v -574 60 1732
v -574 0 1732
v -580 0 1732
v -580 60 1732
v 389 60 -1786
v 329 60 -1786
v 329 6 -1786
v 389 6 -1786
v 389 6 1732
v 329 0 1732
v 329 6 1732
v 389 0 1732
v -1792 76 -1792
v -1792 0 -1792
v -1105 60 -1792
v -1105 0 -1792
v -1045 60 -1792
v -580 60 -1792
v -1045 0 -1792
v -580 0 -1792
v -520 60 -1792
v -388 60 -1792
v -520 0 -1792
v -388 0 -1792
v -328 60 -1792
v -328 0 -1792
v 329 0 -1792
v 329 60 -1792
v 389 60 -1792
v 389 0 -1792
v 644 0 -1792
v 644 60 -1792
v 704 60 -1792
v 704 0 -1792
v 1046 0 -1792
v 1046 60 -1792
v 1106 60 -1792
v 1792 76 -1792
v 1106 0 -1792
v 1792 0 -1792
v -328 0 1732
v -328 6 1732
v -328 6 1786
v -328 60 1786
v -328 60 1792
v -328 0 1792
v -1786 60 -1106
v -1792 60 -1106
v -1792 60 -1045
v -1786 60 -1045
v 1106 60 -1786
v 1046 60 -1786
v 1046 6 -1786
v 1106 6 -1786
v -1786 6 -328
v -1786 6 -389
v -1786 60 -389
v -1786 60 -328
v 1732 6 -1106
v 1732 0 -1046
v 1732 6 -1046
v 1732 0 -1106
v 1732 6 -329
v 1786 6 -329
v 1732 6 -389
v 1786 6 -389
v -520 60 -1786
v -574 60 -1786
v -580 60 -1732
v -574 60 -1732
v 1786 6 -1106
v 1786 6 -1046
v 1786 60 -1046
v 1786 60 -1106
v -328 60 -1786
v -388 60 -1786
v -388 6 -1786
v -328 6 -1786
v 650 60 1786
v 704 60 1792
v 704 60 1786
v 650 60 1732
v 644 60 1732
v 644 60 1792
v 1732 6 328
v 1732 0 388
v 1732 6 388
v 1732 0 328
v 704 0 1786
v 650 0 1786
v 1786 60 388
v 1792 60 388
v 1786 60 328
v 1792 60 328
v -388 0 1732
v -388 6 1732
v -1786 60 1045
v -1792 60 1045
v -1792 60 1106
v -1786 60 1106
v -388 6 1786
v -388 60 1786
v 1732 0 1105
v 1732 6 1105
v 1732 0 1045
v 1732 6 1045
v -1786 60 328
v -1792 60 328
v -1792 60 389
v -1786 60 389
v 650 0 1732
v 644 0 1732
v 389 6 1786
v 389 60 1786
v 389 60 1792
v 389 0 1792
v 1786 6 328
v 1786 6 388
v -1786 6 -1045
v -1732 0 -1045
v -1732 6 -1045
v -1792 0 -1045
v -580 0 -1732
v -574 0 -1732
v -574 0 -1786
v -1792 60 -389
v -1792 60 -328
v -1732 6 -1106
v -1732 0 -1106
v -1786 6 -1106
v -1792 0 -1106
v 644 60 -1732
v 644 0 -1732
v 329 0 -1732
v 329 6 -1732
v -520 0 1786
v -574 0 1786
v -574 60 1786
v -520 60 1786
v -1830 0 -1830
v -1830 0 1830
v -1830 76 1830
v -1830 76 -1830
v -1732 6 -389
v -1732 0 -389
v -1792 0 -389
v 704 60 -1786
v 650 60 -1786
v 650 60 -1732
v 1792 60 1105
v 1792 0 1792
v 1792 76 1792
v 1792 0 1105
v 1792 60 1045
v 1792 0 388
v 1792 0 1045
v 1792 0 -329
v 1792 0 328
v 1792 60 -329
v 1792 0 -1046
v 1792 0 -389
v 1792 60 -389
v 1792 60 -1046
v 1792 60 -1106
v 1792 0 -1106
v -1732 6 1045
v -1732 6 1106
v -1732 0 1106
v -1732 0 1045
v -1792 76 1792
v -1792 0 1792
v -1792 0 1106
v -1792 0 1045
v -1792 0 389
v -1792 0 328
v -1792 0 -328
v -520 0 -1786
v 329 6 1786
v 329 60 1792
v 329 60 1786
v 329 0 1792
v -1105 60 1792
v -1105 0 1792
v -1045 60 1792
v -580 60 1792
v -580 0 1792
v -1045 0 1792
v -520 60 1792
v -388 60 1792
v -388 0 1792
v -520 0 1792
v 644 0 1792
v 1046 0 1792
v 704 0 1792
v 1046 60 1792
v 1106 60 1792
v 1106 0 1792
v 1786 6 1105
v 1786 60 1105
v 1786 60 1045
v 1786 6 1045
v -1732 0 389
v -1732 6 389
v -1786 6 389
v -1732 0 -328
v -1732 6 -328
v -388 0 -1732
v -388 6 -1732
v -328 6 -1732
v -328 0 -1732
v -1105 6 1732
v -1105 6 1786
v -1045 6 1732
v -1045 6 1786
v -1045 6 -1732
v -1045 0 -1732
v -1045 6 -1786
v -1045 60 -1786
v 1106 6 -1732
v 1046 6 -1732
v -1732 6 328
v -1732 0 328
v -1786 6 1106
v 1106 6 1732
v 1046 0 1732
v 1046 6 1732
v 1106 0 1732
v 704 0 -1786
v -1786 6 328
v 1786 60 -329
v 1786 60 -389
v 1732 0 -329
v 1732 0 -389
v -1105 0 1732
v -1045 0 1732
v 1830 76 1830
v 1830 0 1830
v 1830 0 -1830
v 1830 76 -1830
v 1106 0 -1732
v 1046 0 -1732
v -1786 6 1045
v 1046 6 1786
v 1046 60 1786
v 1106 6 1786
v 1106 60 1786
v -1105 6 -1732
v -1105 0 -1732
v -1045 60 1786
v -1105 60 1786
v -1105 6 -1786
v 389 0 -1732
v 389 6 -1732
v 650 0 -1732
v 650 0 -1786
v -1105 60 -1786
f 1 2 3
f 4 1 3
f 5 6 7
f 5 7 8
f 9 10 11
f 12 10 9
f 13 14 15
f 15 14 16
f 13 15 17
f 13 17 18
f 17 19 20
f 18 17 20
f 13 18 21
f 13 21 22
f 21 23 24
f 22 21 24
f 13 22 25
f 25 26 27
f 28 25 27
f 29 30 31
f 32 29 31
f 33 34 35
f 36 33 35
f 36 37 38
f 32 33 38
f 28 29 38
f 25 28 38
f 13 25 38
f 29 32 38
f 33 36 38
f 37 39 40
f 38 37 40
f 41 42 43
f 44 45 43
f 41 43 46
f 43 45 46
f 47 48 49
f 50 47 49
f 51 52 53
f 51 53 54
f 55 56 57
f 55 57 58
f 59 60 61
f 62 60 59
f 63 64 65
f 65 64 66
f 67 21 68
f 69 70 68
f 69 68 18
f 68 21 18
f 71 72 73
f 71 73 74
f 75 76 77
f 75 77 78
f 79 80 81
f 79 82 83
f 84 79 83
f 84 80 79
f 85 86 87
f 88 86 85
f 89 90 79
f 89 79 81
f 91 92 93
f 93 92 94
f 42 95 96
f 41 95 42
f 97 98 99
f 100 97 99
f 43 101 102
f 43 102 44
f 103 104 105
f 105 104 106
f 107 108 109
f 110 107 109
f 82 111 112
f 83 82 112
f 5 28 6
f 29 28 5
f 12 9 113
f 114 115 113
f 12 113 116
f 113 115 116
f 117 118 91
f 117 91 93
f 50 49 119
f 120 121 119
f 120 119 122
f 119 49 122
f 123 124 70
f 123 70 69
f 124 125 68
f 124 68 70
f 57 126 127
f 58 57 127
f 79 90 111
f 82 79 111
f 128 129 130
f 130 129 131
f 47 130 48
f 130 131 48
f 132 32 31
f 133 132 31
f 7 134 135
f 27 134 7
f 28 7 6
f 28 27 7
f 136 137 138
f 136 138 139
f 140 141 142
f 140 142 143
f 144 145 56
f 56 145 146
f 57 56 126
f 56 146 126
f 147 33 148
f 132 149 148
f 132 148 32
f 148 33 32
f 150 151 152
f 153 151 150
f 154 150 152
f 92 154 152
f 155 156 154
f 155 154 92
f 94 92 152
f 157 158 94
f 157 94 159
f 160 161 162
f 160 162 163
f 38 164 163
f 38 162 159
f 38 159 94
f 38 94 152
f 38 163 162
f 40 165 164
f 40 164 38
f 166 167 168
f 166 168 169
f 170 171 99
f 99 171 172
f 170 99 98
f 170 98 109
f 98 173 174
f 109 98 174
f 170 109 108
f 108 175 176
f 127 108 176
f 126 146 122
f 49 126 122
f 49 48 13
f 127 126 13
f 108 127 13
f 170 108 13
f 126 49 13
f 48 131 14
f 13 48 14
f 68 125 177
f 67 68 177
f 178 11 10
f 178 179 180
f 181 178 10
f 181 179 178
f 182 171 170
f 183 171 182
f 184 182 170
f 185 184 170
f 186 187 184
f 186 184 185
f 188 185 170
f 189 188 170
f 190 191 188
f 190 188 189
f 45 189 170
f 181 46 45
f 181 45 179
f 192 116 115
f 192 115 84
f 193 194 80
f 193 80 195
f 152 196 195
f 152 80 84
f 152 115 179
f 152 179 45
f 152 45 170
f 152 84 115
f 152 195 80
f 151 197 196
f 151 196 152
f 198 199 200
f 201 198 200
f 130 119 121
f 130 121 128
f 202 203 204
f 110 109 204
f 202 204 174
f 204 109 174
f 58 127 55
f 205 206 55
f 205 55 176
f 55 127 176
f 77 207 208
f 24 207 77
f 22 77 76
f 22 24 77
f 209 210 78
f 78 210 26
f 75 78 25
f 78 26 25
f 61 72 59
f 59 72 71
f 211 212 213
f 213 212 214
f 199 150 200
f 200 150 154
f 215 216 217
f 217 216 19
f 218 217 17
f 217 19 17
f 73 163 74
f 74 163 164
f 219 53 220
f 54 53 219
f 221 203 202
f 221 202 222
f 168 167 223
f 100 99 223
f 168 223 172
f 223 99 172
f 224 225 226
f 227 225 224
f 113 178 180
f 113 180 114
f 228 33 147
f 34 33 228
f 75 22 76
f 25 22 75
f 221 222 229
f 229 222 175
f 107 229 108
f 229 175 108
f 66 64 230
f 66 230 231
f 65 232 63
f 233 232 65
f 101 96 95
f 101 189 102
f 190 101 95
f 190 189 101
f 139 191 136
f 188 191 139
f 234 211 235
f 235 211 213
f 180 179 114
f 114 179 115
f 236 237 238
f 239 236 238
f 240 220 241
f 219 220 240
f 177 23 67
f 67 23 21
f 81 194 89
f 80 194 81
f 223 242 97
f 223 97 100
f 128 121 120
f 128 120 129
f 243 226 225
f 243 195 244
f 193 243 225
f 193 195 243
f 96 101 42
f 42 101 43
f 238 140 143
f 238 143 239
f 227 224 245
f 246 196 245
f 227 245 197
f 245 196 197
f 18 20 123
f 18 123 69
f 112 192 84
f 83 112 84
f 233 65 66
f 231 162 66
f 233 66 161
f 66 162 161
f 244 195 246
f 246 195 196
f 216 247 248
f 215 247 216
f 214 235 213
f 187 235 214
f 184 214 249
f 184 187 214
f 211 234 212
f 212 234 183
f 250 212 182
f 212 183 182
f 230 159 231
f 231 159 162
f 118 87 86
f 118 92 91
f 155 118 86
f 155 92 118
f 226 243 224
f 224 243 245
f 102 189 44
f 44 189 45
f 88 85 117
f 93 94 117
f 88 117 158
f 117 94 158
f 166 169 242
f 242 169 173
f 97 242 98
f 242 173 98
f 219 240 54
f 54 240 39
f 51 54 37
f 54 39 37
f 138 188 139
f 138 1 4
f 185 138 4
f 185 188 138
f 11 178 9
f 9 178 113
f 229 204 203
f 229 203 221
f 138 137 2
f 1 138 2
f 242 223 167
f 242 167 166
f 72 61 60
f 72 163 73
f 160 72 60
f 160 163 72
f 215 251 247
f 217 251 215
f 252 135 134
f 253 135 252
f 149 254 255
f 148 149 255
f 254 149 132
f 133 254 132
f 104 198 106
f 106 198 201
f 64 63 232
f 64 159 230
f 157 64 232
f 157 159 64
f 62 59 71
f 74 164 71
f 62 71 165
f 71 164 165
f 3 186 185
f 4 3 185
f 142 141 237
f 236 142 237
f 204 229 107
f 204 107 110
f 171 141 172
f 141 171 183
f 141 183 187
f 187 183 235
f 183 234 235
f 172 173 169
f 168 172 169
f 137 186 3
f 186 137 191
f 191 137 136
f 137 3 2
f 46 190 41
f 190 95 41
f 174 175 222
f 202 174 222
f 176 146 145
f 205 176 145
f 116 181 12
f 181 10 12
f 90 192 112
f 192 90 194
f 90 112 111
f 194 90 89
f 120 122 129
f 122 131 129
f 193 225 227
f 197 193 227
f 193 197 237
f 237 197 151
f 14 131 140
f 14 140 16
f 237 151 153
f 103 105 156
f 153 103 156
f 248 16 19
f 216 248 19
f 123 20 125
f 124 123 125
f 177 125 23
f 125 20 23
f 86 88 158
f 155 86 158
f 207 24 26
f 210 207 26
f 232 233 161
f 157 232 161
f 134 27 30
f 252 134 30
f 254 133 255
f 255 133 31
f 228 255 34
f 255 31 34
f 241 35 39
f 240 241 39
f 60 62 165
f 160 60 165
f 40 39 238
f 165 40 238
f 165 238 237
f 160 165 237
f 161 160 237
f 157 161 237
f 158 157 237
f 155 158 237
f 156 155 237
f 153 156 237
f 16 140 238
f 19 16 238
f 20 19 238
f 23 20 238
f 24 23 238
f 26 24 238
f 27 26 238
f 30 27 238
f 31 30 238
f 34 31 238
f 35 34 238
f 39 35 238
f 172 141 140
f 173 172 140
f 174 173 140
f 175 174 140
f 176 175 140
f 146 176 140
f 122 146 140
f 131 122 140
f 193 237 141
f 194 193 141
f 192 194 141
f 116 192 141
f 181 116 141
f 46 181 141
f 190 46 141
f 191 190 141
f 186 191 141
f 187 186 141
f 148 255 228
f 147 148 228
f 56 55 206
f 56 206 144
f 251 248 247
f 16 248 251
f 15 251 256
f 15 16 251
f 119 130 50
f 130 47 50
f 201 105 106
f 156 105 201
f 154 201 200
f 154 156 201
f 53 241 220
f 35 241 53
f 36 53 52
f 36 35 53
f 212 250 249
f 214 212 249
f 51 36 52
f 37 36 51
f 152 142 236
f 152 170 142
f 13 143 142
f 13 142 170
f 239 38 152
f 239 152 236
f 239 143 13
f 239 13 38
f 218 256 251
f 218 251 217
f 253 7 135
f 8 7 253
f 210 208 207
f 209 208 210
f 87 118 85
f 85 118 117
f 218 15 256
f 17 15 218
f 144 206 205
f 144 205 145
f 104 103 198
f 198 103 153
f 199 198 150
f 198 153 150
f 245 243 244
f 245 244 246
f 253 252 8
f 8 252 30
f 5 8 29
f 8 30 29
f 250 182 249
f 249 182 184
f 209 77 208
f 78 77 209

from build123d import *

# Parameters (mm, degrees)
SKETCH1_W                = 3660
SKETCH1_H                = 3660
SKETCH1_W_2              = 3584
SKETCH1_H_2              = 3584
BOSS_EXTRUDE1_DEPTH      = 76
SKETCH2_W                = 60
SKETCH2_H                = 60
BOSS_EXTRUDE2_DEPTH      = 6
SKETCH4_W                = 60
SKETCH4_H                = 6
BOSS_EXTRUDE3_DEPTH      = 54
LPATTERN1_COUNT          = 4
LPATTERN1_PITCH          = 717
MIRROR1_COPY_1_SKETCH_W  = 60
MIRROR1_COPY_1_SKETCH_H  = 60
MIRROR1_COPY_1_DEPTH     = 6
MIRROR1_COPY_2_SKETCH_W  = 60
MIRROR1_COPY_2_SKETCH_H  = 60
MIRROR1_COPY_2_DEPTH     = 6
MIRROR1_COPY_3_SKETCH_W  = 60
MIRROR1_COPY_3_SKETCH_H  = 60
MIRROR1_COPY_3_DEPTH     = 6
MIRROR1_COPY_4_SKETCH_W  = 60
MIRROR1_COPY_4_SKETCH_H  = 6
MIRROR1_COPY_4_DEPTH     = 54
MIRROR1_COPY_5_SKETCH_W  = 60
MIRROR1_COPY_5_SKETCH_H  = 6
MIRROR1_COPY_5_DEPTH     = 54
MIRROR1_COPY_6_SKETCH_W  = 60
MIRROR1_COPY_6_SKETCH_H  = 6
MIRROR1_COPY_6_DEPTH     = 54
MIRROR2_COPY_1_SKETCH_W  = 60
MIRROR2_COPY_1_SKETCH_H  = 60
MIRROR2_COPY_1_DEPTH     = 6
MIRROR2_COPY_2_SKETCH_W  = 60
MIRROR2_COPY_2_SKETCH_H  = 60
MIRROR2_COPY_2_DEPTH     = 6
MIRROR2_COPY_3_SKETCH_W  = 60
MIRROR2_COPY_3_SKETCH_H  = 60
MIRROR2_COPY_3_DEPTH     = 6
MIRROR2_COPY_4_SKETCH_W  = 60
MIRROR2_COPY_4_SKETCH_H  = 6
MIRROR2_COPY_4_DEPTH     = 54
MIRROR2_COPY_5_SKETCH_W  = 60
MIRROR2_COPY_5_SKETCH_H  = 6
MIRROR2_COPY_5_DEPTH     = 54
MIRROR2_COPY_6_SKETCH_W  = 60
MIRROR2_COPY_6_SKETCH_H  = 6
MIRROR2_COPY_6_DEPTH     = 54
MIRROR3_COPY_1_SKETCH_W  = 60
MIRROR3_COPY_1_SKETCH_H  = 60
MIRROR3_COPY_1_DEPTH     = 6
MIRROR3_COPY_2_SKETCH_W  = 60
MIRROR3_COPY_2_SKETCH_H  = 6
MIRROR3_COPY_2_DEPTH     = 54
MIRROR3_COPY_3_SKETCH_W  = 60
MIRROR3_COPY_3_SKETCH_H  = 60
MIRROR3_COPY_3_DEPTH     = 6
MIRROR3_COPY_4_SKETCH_W  = 60
MIRROR3_COPY_4_SKETCH_H  = 60
MIRROR3_COPY_4_DEPTH     = 6
MIRROR3_COPY_5_SKETCH_W  = 60
MIRROR3_COPY_5_SKETCH_H  = 60
MIRROR3_COPY_5_DEPTH     = 6
MIRROR3_COPY_6_SKETCH_W  = 60
MIRROR3_COPY_6_SKETCH_H  = 6
MIRROR3_COPY_6_DEPTH     = 54
MIRROR3_COPY_7_SKETCH_W  = 60
MIRROR3_COPY_7_SKETCH_H  = 6
MIRROR3_COPY_7_DEPTH     = 54
MIRROR3_COPY_8_SKETCH_W  = 60
MIRROR3_COPY_8_SKETCH_H  = 6
MIRROR3_COPY_8_DEPTH     = 54
MIRROR3_COPY_9_SKETCH_W  = 60
MIRROR3_COPY_9_SKETCH_H  = 6
MIRROR3_COPY_9_DEPTH     = 54
MIRROR3_COPY_10_SKETCH_W = 60
MIRROR3_COPY_10_SKETCH_H = 60
MIRROR3_COPY_10_DEPTH    = 6
MIRROR3_COPY_11_SKETCH_W = 60
MIRROR3_COPY_11_SKETCH_H = 60
MIRROR3_COPY_11_DEPTH    = 6
MIRROR3_COPY_12_SKETCH_W = 60
MIRROR3_COPY_12_SKETCH_H = 60
MIRROR3_COPY_12_DEPTH    = 6
MIRROR3_COPY_13_SKETCH_W = 60
MIRROR3_COPY_13_SKETCH_H = 6
MIRROR3_COPY_13_DEPTH    = 54
MIRROR3_COPY_14_SKETCH_W = 60
MIRROR3_COPY_14_SKETCH_H = 6
MIRROR3_COPY_14_DEPTH    = 54
MIRROR3_COPY_15_SKETCH_W = 60
MIRROR3_COPY_15_SKETCH_H = 6
MIRROR3_COPY_15_DEPTH    = 54
MIRROR3_COPY_16_SKETCH_W = 60
MIRROR3_COPY_16_SKETCH_H = 6
MIRROR3_COPY_16_DEPTH    = 54
SKETCH5_W                = 60
SKETCH5_H                = 60
BOSS_EXTRUDE4_DEPTH      = 60
SKETCH7_W                = 54
SKETCH7_H                = 54
CUT_EXTRUDE2_DEPTH       = 60
LPATTERN2_COUNT          = 2
LPATTERN2_PITCH          = 1224
MIRROR4_COPY_1_SKETCH_W  = 60
MIRROR4_COPY_1_SKETCH_H  = 60
MIRROR4_COPY_1_DEPTH     = 60
MIRROR4_COPY_2_SKETCH_W  = 54
MIRROR4_COPY_2_SKETCH_H  = 54
MIRROR4_COPY_2_DEPTH     = 60


with BuildPart() as part:
    # Sketch1 → Boss-Extrude1 (new body)
    with BuildSketch(Plane(origin=(0, 0, 0), x_dir=(1, 0, 0), z_dir=(0, 1, 0))):
        Rectangle(SKETCH1_W, SKETCH1_H)
        Rectangle(SKETCH1_W_2, SKETCH1_H_2, mode=Mode.SUBTRACT)
    extrude(amount=BOSS_EXTRUDE1_DEPTH)

    # Sketch2 → Boss-Extrude2 (add)
    with BuildSketch(Plane(origin=(-1792, 0, 0), x_dir=(0, 0, -1), z_dir=(1, 0, 0))):
        with Locations((-1075, 30)):
            Rectangle(SKETCH2_W, SKETCH2_H)
    boss_extrude2 = extrude(amount=BOSS_EXTRUDE2_DEPTH)

    # Sketch4 → Boss-Extrude3 (add)
    with BuildSketch(Plane(origin=(-1786, 0, 0), x_dir=(0, 0, -1), z_dir=(1, 0, 0))):
        with Locations((-1075, 3)):
            Rectangle(SKETCH4_W, SKETCH4_H)
    boss_extrude3 = extrude(amount=BOSS_EXTRUDE3_DEPTH)

    # LPattern1: Boss-Extrude2, Boss-Extrude3 ×4
    with Locations(*[(0, 0, -i * LPATTERN1_PITCH) for i in range(1, LPATTERN1_COUNT)]):
        add(boss_extrude2)
        add(boss_extrude3)

    # Mirror1: Boss-Extrude2, Boss-Extrude3 across plane
    add(boss_extrude2.mirror(Plane(origin=(0, 0, 0), x_dir=(0, 0, 1), z_dir=(1, 0, 0))))
    add(boss_extrude3.mirror(Plane(origin=(0, 0, 0), x_dir=(0, 0, 1), z_dir=(1, 0, 0))))

    # Mirror1 copy 1 sketch → Mirror1 copy 1 (add)
    with BuildSketch(Plane(origin=(1792, 0, -717), x_dir=(0, 0, -1), z_dir=(-1, 0, 0))):
        with Locations((-1075, -30)):
            Rectangle(MIRROR1_COPY_1_SKETCH_W, MIRROR1_COPY_1_SKETCH_H)
    extrude(amount=MIRROR1_COPY_1_DEPTH)

    # Mirror1 copy 2 sketch → Mirror1 copy 2 (add)
    with BuildSketch(Plane(origin=(1792, 0, -1434), x_dir=(0, 0, -1), z_dir=(-1, 0, 0))):
        with Locations((-1075, -30)):
            Rectangle(MIRROR1_COPY_2_SKETCH_W, MIRROR1_COPY_2_SKETCH_H)
    extrude(amount=MIRROR1_COPY_2_DEPTH)

    # Mirror1 copy 3 sketch → Mirror1 copy 3 (add)
    with BuildSketch(Plane(origin=(1792, 0, -2151), x_dir=(0, 0, -1), z_dir=(-1, 0, 0))):
        with Locations((-1075, -30)):
            Rectangle(MIRROR1_COPY_3_SKETCH_W, MIRROR1_COPY_3_SKETCH_H)
    extrude(amount=MIRROR1_COPY_3_DEPTH)

    # Mirror1 copy 4 sketch → Mirror1 copy 4 (add)
    with BuildSketch(Plane(origin=(1786, 0, -717), x_dir=(0, 0, -1), z_dir=(-1, 0, 0))):
        with Locations((-1075, -3)):
            Rectangle(MIRROR1_COPY_4_SKETCH_W, MIRROR1_COPY_4_SKETCH_H)
    extrude(amount=MIRROR1_COPY_4_DEPTH)

    # Mirror1 copy 5 sketch → Mirror1 copy 5 (add)
    with BuildSketch(Plane(origin=(1786, 0, -1434), x_dir=(0, 0, -1), z_dir=(-1, 0, 0))):
        with Locations((-1075, -3)):
            Rectangle(MIRROR1_COPY_5_SKETCH_W, MIRROR1_COPY_5_SKETCH_H)
    extrude(amount=MIRROR1_COPY_5_DEPTH)

    # Mirror1 copy 6 sketch → Mirror1 copy 6 (add)
    with BuildSketch(Plane(origin=(1786, 0, -2151), x_dir=(0, 0, -1), z_dir=(-1, 0, 0))):
        with Locations((-1075, -3)):
            Rectangle(MIRROR1_COPY_6_SKETCH_W, MIRROR1_COPY_6_SKETCH_H)
    extrude(amount=MIRROR1_COPY_6_DEPTH)

    # Mirror2: Boss-Extrude2, Boss-Extrude3 across plane
    add(boss_extrude2.mirror(Plane(origin=(0, 0, 0), x_dir=(-0.707106781, 0, 0.707106781), z_dir=(-0.707106781, 0, -0.707106781))))
    add(boss_extrude3.mirror(Plane(origin=(0, 0, 0), x_dir=(-0.707106781, 0, 0.707106781), z_dir=(-0.707106781, 0, -0.707106781))))

    # Mirror2 copy 1 sketch → Mirror2 copy 1 (add)
    with BuildSketch(Plane(origin=(717, 0, 1792), x_dir=(1, 0, 0), z_dir=(0, 0, -1))):
        with Locations((-1075, -30)):
            Rectangle(MIRROR2_COPY_1_SKETCH_W, MIRROR2_COPY_1_SKETCH_H)
    extrude(amount=MIRROR2_COPY_1_DEPTH)

    # Mirror2 copy 2 sketch → Mirror2 copy 2 (add)
    with BuildSketch(Plane(origin=(1434, 0, 1792), x_dir=(1, 0, 0), z_dir=(0, 0, -1))):
        with Locations((-1075, -30)):
            Rectangle(MIRROR2_COPY_2_SKETCH_W, MIRROR2_COPY_2_SKETCH_H)
    extrude(amount=MIRROR2_COPY_2_DEPTH)

    # Mirror2 copy 3 sketch → Mirror2 copy 3 (add)
    with BuildSketch(Plane(origin=(2151, 0, 1792), x_dir=(1, 0, 0), z_dir=(0, 0, -1))):
        with Locations((-1075, -30)):
            Rectangle(MIRROR2_COPY_3_SKETCH_W, MIRROR2_COPY_3_SKETCH_H)
    extrude(amount=MIRROR2_COPY_3_DEPTH)

    # Mirror2 copy 4 sketch → Mirror2 copy 4 (add)
    with BuildSketch(Plane(origin=(717, 0, 1786), x_dir=(1, 0, 0), z_dir=(0, 0, -1))):
        with Locations((-1075, -3)):
            Rectangle(MIRROR2_COPY_4_SKETCH_W, MIRROR2_COPY_4_SKETCH_H)
    extrude(amount=MIRROR2_COPY_4_DEPTH)

    # Mirror2 copy 5 sketch → Mirror2 copy 5 (add)
    with BuildSketch(Plane(origin=(1434, 0, 1786), x_dir=(1, 0, 0), z_dir=(0, 0, -1))):
        with Locations((-1075, -3)):
            Rectangle(MIRROR2_COPY_5_SKETCH_W, MIRROR2_COPY_5_SKETCH_H)
    extrude(amount=MIRROR2_COPY_5_DEPTH)

    # Mirror2 copy 6 sketch → Mirror2 copy 6 (add)
    with BuildSketch(Plane(origin=(2151, 0, 1786), x_dir=(1, 0, 0), z_dir=(0, 0, -1))):
        with Locations((-1075, -3)):
            Rectangle(MIRROR2_COPY_6_SKETCH_W, MIRROR2_COPY_6_SKETCH_H)
    extrude(amount=MIRROR2_COPY_6_DEPTH)

    # Mirror3: Boss-Extrude2 across plane
    add(boss_extrude2.mirror(Plane.XY))

    # Mirror3 copy 1 sketch → Mirror3 copy 1 (add)
    with BuildSketch(Plane.XY.offset(-1792)):
        with Locations((-1075, 30)):
            Rectangle(MIRROR3_COPY_1_SKETCH_W, MIRROR3_COPY_1_SKETCH_H)
    extrude(amount=MIRROR3_COPY_1_DEPTH)

    # Mirror3 copy 2 sketch → Mirror3 copy 2 (add)
    with BuildSketch(Plane.XY.offset(-1786)):
        with Locations((-1075, 3)):
            Rectangle(MIRROR3_COPY_2_SKETCH_W, MIRROR3_COPY_2_SKETCH_H)
    extrude(amount=MIRROR3_COPY_2_DEPTH)

    # Mirror3 copy 3 sketch → Mirror3 copy 3 (add)
    with BuildSketch(Plane(origin=(717, 0, -1792), x_dir=(1, 0, 0), z_dir=(0, 0, 1))):
        with Locations((-1075, 30)):
            Rectangle(MIRROR3_COPY_3_SKETCH_W, MIRROR3_COPY_3_SKETCH_H)
    extrude(amount=MIRROR3_COPY_3_DEPTH)

    # Mirror3 copy 4 sketch → Mirror3 copy 4 (add)
    with BuildSketch(Plane(origin=(1434, 0, -1792), x_dir=(1, 0, 0), z_dir=(0, 0, 1))):
        with Locations((-1075, 30)):
            Rectangle(MIRROR3_COPY_4_SKETCH_W, MIRROR3_COPY_4_SKETCH_H)
    extrude(amount=MIRROR3_COPY_4_DEPTH)

    # Mirror3 copy 5 sketch → Mirror3 copy 5 (add)
    with BuildSketch(Plane(origin=(2151, 0, -1792), x_dir=(1, 0, 0), z_dir=(0, 0, 1))):
        with Locations((-1075, 30)):
            Rectangle(MIRROR3_COPY_5_SKETCH_W, MIRROR3_COPY_5_SKETCH_H)
    extrude(amount=MIRROR3_COPY_5_DEPTH)

    # Mirror3 copy 6 sketch → Mirror3 copy 6 (add)
    with BuildSketch(Plane(origin=(717, 0, -1786), x_dir=(1, 0, 0), z_dir=(0, 0, 1))):
        with Locations((-1075, 3)):
            Rectangle(MIRROR3_COPY_6_SKETCH_W, MIRROR3_COPY_6_SKETCH_H)
    extrude(amount=MIRROR3_COPY_6_DEPTH)

    # Mirror3 copy 7 sketch → Mirror3 copy 7 (add)
    with BuildSketch(Plane(origin=(1434, 0, -1786), x_dir=(1, 0, 0), z_dir=(0, 0, 1))):
        with Locations((-1075, 3)):
            Rectangle(MIRROR3_COPY_7_SKETCH_W, MIRROR3_COPY_7_SKETCH_H)
    extrude(amount=MIRROR3_COPY_7_DEPTH)

    # Mirror3 copy 8 sketch → Mirror3 copy 8 (add)
    with BuildSketch(Plane(origin=(2151, 0, -1786), x_dir=(1, 0, 0), z_dir=(0, 0, 1))):
        with Locations((-1075, 3)):
            Rectangle(MIRROR3_COPY_8_SKETCH_W, MIRROR3_COPY_8_SKETCH_H)
    extrude(amount=MIRROR3_COPY_8_DEPTH)

    # Mirror3 copy 9 sketch → Mirror3 copy 9 (add)
    with BuildSketch(Plane(origin=(-1786, 0, 0), x_dir=(0, 0, 1), z_dir=(1, 0, 0))):
        with Locations((-1075, -3)):
            Rectangle(MIRROR3_COPY_9_SKETCH_W, MIRROR3_COPY_9_SKETCH_H)
    extrude(amount=MIRROR3_COPY_9_DEPTH)

    # Mirror3 copy 10 sketch → Mirror3 copy 10 (add)
    with BuildSketch(Plane(origin=(-1792, 0, 717), x_dir=(0, 0, 1), z_dir=(1, 0, 0))):
        with Locations((-1075, -30)):
            Rectangle(MIRROR3_COPY_10_SKETCH_W, MIRROR3_COPY_10_SKETCH_H)
    extrude(amount=MIRROR3_COPY_10_DEPTH)

    # Mirror3 copy 11 sketch → Mirror3 copy 11 (add)
    with BuildSketch(Plane(origin=(-1792, 0, 1434), x_dir=(0, 0, 1), z_dir=(1, 0, 0))):
        with Locations((-1075, -30)):
            Rectangle(MIRROR3_COPY_11_SKETCH_W, MIRROR3_COPY_11_SKETCH_H)
    extrude(amount=MIRROR3_COPY_11_DEPTH)

    # Mirror3 copy 12 sketch → Mirror3 copy 12 (add)
    with BuildSketch(Plane(origin=(-1792, 0, 2151), x_dir=(0, 0, 1), z_dir=(1, 0, 0))):
        with Locations((-1075, -30)):
            Rectangle(MIRROR3_COPY_12_SKETCH_W, MIRROR3_COPY_12_SKETCH_H)
    extrude(amount=MIRROR3_COPY_12_DEPTH)

    # Mirror3 copy 13 sketch → Mirror3 copy 13 (add)
    with BuildSketch(Plane(origin=(-1786, 0, 717), x_dir=(0, 0, 1), z_dir=(1, 0, 0))):
        with Locations((-1075, -3)):
            Rectangle(MIRROR3_COPY_13_SKETCH_W, MIRROR3_COPY_13_SKETCH_H)
    extrude(amount=MIRROR3_COPY_13_DEPTH)

    # Mirror3 copy 14 sketch → Mirror3 copy 14 (add)
    with BuildSketch(Plane(origin=(-1786, 0, 1434), x_dir=(0, 0, 1), z_dir=(1, 0, 0))):
        with Locations((-1075, -3)):
            Rectangle(MIRROR3_COPY_14_SKETCH_W, MIRROR3_COPY_14_SKETCH_H)
    extrude(amount=MIRROR3_COPY_14_DEPTH)

    # Mirror3 copy 15 sketch → Mirror3 copy 15 (add)
    with BuildSketch(Plane(origin=(-1786, 0, 2151), x_dir=(0, 0, 1), z_dir=(1, 0, 0))):
        with Locations((-1075, -3)):
            Rectangle(MIRROR3_COPY_15_SKETCH_W, MIRROR3_COPY_15_SKETCH_H)
    extrude(amount=MIRROR3_COPY_15_DEPTH)

    # Mirror3 copy 16 sketch → Mirror3 copy 16 (add)
    with BuildSketch(Plane(origin=(-1786, 0, 0), x_dir=(0, 0, 1), z_dir=(1, 0, 0))):
        with Locations((-1075, -3)):
            Rectangle(MIRROR3_COPY_16_SKETCH_W, MIRROR3_COPY_16_SKETCH_H)
    extrude(amount=MIRROR3_COPY_16_DEPTH)

    # Sketch5 → Boss-Extrude4 (add)
    with BuildSketch(Plane(origin=(0, 0, 1792), x_dir=(-1, 0, 0), z_dir=(0, 0, -1))):
        with Locations((550, 30)):
            Rectangle(SKETCH5_W, SKETCH5_H)
    boss_extrude4 = extrude(amount=BOSS_EXTRUDE4_DEPTH)

    # Sketch7 → Cut-Extrude2 (cut)
    with BuildSketch(Plane(origin=(0, 60, 0), x_dir=(1, 0, 0), z_dir=(0, 1, 0))):
        with Locations((-547, -1759)):
            Rectangle(SKETCH7_W, SKETCH7_H)
    cut_extrude2 = extrude(amount=-CUT_EXTRUDE2_DEPTH, mode=Mode.SUBTRACT)

    # LPattern2: Boss-Extrude4, Cut-Extrude2 ×2
    with Locations(*[(i * LPATTERN2_PITCH, 0, 0) for i in range(1, LPATTERN2_COUNT)]):
        add(boss_extrude4)
        add(cut_extrude2, mode=Mode.SUBTRACT)

    # Mirror4: Boss-Extrude4, Cut-Extrude2 across plane
    add(boss_extrude4.mirror(Plane.XY))
    add(cut_extrude2.mirror(Plane.XY), mode=Mode.SUBTRACT)

    # Mirror4 copy 1 sketch → Mirror4 copy 1 (add)
    with BuildSketch(Plane(origin=(1224, 0, -1792), x_dir=(-1, 0, 0), z_dir=(0, 0, 1))):
        with Locations((550, -30)):
            Rectangle(MIRROR4_COPY_1_SKETCH_W, MIRROR4_COPY_1_SKETCH_H)
    extrude(amount=MIRROR4_COPY_1_DEPTH)

    # Mirror4 copy 2 sketch → Mirror4 copy 2 (cut)
    with BuildSketch(Plane(origin=(1224, 60, 0), x_dir=(1, 0, 0), z_dir=(0, 1, 0))):
        with Locations((-547, 1759)):
            Rectangle(MIRROR4_COPY_2_SKETCH_W, MIRROR4_COPY_2_SKETCH_H)
    extrude(amount=-MIRROR4_COPY_2_DEPTH, mode=Mode.SUBTRACT)


solid = part.part
